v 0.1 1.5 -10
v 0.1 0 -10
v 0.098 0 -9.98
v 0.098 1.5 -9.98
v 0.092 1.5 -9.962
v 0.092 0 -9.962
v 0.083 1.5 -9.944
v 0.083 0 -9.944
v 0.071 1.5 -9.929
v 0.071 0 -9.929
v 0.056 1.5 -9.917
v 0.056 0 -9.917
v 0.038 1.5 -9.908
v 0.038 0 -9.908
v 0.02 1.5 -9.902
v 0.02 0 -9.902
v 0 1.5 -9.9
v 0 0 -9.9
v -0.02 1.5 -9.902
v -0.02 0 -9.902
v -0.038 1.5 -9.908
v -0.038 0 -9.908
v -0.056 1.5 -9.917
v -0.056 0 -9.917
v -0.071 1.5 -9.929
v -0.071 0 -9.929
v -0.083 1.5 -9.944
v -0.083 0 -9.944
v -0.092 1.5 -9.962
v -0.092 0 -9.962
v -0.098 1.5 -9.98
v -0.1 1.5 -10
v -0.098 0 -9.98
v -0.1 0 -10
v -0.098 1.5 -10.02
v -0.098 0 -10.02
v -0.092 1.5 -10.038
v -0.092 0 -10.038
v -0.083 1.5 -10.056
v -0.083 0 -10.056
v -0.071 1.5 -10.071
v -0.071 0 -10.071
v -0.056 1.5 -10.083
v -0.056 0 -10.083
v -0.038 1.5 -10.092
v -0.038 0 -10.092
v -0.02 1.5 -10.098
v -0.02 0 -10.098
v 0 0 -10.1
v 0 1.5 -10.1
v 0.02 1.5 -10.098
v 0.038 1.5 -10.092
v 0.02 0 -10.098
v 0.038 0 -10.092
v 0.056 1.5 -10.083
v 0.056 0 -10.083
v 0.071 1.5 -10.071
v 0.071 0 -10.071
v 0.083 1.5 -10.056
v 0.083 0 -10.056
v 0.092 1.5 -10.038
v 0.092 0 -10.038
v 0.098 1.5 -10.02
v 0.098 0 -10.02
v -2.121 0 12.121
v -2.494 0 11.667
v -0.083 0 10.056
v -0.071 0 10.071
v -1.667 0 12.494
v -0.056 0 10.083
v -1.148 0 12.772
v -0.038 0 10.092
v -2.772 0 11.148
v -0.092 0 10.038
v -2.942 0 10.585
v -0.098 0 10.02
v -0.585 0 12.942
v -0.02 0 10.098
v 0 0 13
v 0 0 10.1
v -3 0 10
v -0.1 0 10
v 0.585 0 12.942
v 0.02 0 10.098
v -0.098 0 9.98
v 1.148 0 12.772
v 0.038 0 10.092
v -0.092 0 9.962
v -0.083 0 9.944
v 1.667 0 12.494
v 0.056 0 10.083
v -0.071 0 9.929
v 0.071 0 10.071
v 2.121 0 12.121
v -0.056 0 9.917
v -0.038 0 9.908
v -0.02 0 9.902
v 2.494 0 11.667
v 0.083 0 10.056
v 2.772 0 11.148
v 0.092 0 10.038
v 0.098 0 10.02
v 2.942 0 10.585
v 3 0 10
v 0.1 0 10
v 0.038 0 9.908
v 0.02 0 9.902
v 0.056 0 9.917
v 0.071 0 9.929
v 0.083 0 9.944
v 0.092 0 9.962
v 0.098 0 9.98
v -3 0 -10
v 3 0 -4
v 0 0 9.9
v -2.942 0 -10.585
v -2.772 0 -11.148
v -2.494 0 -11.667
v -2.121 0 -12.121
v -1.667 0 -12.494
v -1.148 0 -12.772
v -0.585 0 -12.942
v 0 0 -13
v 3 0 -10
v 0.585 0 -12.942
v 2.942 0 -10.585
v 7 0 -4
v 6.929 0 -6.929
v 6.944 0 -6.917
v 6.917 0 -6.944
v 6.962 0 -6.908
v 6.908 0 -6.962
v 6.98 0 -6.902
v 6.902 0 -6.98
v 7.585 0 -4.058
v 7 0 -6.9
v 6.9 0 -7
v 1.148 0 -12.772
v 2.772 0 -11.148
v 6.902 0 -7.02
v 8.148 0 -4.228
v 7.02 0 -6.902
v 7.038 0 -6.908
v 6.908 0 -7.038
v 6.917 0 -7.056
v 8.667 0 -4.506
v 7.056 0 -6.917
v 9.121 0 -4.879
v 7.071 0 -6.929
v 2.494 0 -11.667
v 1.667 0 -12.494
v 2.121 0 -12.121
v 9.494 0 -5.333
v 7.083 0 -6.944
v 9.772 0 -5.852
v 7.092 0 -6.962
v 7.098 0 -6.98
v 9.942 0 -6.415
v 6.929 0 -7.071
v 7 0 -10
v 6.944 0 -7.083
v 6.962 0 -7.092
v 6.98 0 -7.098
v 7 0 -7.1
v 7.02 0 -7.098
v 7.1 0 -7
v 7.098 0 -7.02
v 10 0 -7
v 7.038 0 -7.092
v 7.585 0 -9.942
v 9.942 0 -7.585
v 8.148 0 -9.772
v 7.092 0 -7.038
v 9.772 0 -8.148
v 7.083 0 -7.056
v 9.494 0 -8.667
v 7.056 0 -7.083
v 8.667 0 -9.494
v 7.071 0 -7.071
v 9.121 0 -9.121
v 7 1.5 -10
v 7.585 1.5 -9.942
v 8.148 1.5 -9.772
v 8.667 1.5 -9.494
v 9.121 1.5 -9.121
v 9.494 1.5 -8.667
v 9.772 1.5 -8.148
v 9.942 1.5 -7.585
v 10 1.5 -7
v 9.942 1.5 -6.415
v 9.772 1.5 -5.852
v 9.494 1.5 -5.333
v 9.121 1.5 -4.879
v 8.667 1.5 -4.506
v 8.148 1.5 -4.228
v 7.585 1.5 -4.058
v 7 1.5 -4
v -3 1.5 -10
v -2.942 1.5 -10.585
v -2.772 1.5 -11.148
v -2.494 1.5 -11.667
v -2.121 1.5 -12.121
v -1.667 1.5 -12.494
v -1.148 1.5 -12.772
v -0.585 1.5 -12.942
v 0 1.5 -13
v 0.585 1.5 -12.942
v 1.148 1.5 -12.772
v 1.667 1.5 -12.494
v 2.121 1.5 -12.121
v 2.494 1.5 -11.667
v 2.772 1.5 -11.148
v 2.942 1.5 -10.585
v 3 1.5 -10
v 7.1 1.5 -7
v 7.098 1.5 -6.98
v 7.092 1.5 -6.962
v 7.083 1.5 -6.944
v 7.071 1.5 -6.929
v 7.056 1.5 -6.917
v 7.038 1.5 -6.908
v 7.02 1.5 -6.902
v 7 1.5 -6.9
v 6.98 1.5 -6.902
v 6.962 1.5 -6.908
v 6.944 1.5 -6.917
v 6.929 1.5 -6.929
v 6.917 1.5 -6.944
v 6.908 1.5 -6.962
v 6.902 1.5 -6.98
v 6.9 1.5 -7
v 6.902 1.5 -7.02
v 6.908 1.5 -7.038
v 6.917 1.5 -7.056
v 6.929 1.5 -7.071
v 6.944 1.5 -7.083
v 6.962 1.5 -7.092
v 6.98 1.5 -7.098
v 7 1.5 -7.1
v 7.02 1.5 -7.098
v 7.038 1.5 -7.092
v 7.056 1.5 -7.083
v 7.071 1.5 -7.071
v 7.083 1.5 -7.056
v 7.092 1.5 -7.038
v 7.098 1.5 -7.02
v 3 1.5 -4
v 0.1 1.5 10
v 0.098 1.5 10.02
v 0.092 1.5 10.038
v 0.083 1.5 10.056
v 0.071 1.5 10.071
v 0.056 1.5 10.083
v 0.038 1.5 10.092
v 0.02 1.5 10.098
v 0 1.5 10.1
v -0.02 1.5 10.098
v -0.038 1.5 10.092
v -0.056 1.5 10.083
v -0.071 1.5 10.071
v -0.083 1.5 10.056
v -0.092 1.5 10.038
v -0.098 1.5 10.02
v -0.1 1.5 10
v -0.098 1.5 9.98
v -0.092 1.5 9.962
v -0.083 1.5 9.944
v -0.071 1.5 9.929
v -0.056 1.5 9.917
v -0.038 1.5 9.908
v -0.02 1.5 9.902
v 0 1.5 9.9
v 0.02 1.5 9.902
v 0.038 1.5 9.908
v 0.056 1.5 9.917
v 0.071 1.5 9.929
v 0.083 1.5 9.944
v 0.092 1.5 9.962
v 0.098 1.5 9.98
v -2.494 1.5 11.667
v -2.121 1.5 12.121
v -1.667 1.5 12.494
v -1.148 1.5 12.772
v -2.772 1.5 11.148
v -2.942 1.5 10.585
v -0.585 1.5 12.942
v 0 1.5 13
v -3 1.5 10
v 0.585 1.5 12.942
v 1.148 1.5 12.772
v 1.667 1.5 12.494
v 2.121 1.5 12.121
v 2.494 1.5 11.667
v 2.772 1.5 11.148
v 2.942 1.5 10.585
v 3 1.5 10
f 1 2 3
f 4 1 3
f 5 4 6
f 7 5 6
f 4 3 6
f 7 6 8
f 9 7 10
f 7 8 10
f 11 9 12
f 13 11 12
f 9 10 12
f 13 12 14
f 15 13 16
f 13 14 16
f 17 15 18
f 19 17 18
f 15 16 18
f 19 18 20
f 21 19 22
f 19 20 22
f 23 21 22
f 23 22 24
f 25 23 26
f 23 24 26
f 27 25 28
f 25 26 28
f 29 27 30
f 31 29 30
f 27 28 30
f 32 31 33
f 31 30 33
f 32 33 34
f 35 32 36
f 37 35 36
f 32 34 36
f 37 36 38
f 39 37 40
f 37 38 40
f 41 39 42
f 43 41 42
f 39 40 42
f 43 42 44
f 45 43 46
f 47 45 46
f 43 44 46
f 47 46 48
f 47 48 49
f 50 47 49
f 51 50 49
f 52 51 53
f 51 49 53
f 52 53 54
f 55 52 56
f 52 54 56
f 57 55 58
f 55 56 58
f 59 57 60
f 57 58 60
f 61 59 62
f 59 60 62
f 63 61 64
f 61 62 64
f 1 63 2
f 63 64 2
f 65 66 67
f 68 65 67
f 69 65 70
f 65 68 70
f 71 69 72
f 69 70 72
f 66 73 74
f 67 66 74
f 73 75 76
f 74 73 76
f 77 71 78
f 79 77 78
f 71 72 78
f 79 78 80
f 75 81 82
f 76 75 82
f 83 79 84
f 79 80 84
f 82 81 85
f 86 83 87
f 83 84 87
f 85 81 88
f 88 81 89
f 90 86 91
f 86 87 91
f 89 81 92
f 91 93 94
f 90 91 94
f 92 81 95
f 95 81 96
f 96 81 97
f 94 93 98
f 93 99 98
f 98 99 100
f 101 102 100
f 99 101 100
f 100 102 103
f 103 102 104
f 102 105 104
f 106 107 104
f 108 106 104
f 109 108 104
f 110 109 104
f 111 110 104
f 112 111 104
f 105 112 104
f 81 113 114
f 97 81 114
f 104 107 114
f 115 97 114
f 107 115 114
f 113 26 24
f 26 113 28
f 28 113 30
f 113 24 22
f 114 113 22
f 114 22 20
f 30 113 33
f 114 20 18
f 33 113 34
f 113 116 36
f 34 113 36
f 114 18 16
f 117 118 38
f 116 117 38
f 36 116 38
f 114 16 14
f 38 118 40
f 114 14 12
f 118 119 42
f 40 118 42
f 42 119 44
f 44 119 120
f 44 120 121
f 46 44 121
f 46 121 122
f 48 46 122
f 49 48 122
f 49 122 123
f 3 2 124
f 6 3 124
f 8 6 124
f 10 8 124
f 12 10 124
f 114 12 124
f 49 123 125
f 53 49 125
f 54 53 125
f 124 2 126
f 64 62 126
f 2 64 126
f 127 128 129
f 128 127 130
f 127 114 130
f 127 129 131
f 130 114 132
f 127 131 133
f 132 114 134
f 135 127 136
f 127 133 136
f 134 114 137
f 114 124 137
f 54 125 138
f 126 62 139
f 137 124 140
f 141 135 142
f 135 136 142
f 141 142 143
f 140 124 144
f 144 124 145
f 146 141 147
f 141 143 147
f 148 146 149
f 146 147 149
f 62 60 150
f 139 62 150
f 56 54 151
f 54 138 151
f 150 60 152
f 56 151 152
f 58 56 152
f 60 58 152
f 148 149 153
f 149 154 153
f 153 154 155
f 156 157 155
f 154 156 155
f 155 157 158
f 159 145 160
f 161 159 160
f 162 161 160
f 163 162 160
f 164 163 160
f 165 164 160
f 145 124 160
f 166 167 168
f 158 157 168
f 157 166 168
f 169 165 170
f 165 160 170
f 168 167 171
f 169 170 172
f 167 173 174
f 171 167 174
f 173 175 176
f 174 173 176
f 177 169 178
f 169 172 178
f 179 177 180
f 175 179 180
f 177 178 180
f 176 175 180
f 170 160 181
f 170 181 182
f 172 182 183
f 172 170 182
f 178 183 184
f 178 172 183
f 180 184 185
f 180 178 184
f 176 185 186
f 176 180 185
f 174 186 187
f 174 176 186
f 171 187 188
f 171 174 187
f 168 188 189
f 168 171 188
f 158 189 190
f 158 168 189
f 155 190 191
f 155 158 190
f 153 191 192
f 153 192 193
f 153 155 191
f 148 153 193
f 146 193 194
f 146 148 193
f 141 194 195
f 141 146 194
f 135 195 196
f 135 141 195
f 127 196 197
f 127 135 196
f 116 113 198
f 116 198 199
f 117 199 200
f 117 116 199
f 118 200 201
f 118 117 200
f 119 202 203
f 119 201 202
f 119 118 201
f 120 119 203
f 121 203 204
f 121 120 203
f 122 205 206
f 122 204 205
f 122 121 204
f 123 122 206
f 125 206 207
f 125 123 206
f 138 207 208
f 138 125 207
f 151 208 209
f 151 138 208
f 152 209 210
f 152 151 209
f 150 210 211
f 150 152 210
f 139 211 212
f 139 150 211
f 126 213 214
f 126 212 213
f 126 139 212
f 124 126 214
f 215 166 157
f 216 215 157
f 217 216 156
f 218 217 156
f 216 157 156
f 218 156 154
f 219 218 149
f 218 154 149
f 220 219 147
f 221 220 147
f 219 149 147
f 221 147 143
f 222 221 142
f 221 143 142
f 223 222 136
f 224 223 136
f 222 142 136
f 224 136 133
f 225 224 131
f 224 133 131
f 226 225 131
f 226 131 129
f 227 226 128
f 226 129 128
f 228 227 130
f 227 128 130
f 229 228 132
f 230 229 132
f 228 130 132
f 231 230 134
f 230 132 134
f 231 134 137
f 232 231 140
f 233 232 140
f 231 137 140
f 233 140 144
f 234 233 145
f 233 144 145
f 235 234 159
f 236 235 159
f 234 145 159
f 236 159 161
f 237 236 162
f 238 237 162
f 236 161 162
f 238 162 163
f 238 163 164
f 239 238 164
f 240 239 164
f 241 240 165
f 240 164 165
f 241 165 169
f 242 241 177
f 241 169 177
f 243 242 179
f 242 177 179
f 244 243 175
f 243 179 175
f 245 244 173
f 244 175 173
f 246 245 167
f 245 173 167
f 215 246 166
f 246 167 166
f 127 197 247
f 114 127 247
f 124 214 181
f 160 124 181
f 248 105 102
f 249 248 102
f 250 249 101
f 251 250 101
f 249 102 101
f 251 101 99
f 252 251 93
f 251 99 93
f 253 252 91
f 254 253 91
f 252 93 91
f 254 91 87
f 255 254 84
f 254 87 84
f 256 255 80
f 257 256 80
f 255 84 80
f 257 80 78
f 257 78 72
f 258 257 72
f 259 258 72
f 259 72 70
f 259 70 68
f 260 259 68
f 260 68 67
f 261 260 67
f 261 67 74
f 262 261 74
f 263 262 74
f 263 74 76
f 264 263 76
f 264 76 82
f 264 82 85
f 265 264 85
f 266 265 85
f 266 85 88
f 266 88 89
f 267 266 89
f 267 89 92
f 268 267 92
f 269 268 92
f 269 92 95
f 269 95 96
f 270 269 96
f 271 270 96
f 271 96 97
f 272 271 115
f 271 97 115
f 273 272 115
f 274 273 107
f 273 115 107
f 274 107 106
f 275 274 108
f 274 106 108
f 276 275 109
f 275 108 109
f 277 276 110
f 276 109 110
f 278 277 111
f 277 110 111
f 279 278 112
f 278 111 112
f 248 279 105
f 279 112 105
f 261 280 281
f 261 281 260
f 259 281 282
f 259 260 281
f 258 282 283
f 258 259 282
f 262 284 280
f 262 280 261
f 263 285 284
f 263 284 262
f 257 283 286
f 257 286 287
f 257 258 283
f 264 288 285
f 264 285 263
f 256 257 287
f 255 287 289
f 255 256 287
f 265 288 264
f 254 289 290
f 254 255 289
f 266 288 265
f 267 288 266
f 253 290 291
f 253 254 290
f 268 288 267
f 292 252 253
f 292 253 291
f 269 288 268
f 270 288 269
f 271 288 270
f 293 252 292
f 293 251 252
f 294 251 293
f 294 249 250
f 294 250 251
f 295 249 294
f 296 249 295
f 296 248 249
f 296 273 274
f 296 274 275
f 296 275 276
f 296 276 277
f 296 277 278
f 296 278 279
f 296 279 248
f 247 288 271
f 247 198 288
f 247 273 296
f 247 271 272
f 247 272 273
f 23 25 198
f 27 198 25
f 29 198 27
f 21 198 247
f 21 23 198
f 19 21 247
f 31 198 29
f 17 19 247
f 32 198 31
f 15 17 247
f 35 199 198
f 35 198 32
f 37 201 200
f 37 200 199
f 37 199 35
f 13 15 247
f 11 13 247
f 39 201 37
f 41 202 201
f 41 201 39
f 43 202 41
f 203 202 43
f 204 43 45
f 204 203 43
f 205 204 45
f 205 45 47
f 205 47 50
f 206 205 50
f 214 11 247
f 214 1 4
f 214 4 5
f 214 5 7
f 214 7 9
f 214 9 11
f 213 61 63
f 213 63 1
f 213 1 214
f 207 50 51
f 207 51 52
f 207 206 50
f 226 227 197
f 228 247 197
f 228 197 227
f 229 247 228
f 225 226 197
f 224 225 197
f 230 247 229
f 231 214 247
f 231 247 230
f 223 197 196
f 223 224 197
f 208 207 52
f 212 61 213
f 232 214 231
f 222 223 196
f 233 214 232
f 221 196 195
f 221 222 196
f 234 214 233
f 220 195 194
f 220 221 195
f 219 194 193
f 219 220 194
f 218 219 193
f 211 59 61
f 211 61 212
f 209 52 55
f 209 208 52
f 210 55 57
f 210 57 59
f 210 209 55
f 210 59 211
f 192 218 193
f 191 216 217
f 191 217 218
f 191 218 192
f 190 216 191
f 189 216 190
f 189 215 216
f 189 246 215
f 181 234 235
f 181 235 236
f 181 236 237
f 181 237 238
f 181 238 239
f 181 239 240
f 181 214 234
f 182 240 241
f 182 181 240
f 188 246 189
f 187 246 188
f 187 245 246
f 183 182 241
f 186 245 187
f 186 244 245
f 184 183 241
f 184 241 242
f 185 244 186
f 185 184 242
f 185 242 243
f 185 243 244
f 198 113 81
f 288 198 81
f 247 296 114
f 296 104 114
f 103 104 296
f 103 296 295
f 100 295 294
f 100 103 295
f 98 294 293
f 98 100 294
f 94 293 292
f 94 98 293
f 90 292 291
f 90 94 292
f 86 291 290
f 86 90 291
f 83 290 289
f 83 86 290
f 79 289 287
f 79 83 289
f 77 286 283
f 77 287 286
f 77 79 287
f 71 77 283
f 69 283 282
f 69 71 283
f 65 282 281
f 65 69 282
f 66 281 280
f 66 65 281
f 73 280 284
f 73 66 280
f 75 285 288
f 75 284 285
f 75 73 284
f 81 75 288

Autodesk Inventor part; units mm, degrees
ref_plane "YZ Plane" through (0, 0, 0) normal (1, 0, 0) x (0, 1, 0)
ref_plane "XZ Plane" through (0, 0, 0) normal (0, 1, 0) x (-1, 0, 0)
ref_plane "XY Plane" through (0, 0, 0) normal (0, 0, 1) x (1, 0, 0)
sketch "Sketch1" plane through (0, 0, 0) normal (0, 1, 0) x (-1, 0, 0)
  line L0 (3, 10) -> (-3, 10)
  line L1 (-3, 10) -> (-3, -10)
  line L2 (-3, -10) -> (3, -10)
  line L3 (3, -10) -> (3, 10)
  line L4 (3, 10) -> (-3, -10) construction
  line L5 (-3, 10) -> (3, -10) construction
  circle A0 centre (0, 10) radius 3
  circle A1 centre (0, -10) radius 3
  line L6 (-3, -10) -> (-7, -10)
  line L7 (-7, -10) -> (-7, -6)
  line L8 (-7, -6) -> (-7, -4)
  line L9 (-7, -4) -> (-3, -4)
  line L10 (-7, -4) -> (-7, -7)
  circle A2 centre (-7, -7) radius 3
  line L11 (-3, -4) -> (-3, -10)
  point P0 (0, 0)
  dimension "d0" = 6
  dimension "d1" = 20
  dimension "d2" = 6
  dimension "d4" = 6
  dimension "d5" = 4
  dimension "d6" = 4
  dimension "d7" = 2
  dimension "d10" = 3
  dimension "d11" = 6
extrude "Extrusion1" add sketch "Sketch1" along normal blind 1.5 contours A0 L0 | L0 A0 | L3 A1 L1 A0 | A1 L2 | L2 A1 | A2 L7 L8 | L8 L7 A2
sketch "Sketch2" plane through (0, 1.5, 0) normal (0, 1, 0) x (1, 0, 0)
  line L0 (3, -10) -> (3, 10) projected
  arc A0 (3, 10) -> (-3, 10) centre (0, 10) ccw projected
  line L1 (-3, 10) -> (-3, -10) projected
  arc A1 (-3, -10) -> (3, -10) centre (0, -10) ccw projected
  circle A2 centre (0, 10) radius 1.5
  circle A3 centre (0, -10) radius 1.5
  line L2 (3, 10) -> (7, 10)
  line L3 (7, 10) -> (7, 4)
  line L4 (7, 4) -> (3, 4)
  line L5 (3, 4) -> (3, 10)
  point P0 (0, 0)
  dimension "d14" = 3
  dimension "d15" = 3
  dimension "d16" = 4
  dimension "d17" = 6
extrude "Extrusion2" cut sketch "Sketch2" against normal blind 1.5 contours L0 L2 L3 L4 | A2 | A3
sketch "Sketch3" plane through (0, 1.5, 0) normal (0, 1, 0) x (1, 0, 0)
  line L0 (3, -10) -> (3, 10) projected
  arc A0 (3, 10) -> (-3, 10) centre (0, 10) ccw projected
  line L1 (-3, 10) -> (-3, -10) projected
  line L2 (3, 10) -> (7, 10)
  line L3 (7, 10) -> (7, 4)
  line L4 (7, 4) -> (3, 4)
  line L5 (3, 4) -> (3, 10)
  point P0 (0, 0)
  dimension "d20" = 4
  dimension "d21" = 6
  dimension "d22" = 4
extrude "Extrusion3" add sketch "Sketch3" against normal blind 1.5
sketch "Sketch4" plane through (0, 1.5, 0) normal (0, 1, 0) x (1, 0, 0)
  arc A0 (7, 4) -> (7, 10) centre (7, 7) ccw projected
  circle A1 centre (7, 7) radius 1.5
  point P0 (0, 0)
  dimension "d25" = 3
extrude "Extrusion4" cut sketch "Sketch4" against normal blind 1.5
sketch "Sketch5" plane through (0, 0, 0) normal (0, -1, 0) x (1, 0, 0)
  circle A0 centre (7, -7) radius 1.5 projected
  circle A1 centre (0, 10) radius 1.5 projected
  circle A2 centre (0, -10) radius 1.5 projected
  arc A3 (7, -10) -> (7, -4) centre (7, -7) ccw projected
  arc A4 (3, 10) -> (-3, 10) centre (0, 10) ccw projected
  arc A5 (-3, -10) -> (3, -10) centre (0, -10) ccw projected
  circle A6 centre (0, 10) radius 0.1
  circle A7 centre (0, -10) radius 0.1
  circle A8 centre (7, -7) radius 0.1
  point P0 (0, 0)
  dimension "d28" = 0.2
  dimension "d29" = 0.2
  dimension "d30" = 0.2
extrude "Extrusion5" add sketch "Sketch5" against normal blind 1.5
properties part number "tahlo3_sablona_20"
